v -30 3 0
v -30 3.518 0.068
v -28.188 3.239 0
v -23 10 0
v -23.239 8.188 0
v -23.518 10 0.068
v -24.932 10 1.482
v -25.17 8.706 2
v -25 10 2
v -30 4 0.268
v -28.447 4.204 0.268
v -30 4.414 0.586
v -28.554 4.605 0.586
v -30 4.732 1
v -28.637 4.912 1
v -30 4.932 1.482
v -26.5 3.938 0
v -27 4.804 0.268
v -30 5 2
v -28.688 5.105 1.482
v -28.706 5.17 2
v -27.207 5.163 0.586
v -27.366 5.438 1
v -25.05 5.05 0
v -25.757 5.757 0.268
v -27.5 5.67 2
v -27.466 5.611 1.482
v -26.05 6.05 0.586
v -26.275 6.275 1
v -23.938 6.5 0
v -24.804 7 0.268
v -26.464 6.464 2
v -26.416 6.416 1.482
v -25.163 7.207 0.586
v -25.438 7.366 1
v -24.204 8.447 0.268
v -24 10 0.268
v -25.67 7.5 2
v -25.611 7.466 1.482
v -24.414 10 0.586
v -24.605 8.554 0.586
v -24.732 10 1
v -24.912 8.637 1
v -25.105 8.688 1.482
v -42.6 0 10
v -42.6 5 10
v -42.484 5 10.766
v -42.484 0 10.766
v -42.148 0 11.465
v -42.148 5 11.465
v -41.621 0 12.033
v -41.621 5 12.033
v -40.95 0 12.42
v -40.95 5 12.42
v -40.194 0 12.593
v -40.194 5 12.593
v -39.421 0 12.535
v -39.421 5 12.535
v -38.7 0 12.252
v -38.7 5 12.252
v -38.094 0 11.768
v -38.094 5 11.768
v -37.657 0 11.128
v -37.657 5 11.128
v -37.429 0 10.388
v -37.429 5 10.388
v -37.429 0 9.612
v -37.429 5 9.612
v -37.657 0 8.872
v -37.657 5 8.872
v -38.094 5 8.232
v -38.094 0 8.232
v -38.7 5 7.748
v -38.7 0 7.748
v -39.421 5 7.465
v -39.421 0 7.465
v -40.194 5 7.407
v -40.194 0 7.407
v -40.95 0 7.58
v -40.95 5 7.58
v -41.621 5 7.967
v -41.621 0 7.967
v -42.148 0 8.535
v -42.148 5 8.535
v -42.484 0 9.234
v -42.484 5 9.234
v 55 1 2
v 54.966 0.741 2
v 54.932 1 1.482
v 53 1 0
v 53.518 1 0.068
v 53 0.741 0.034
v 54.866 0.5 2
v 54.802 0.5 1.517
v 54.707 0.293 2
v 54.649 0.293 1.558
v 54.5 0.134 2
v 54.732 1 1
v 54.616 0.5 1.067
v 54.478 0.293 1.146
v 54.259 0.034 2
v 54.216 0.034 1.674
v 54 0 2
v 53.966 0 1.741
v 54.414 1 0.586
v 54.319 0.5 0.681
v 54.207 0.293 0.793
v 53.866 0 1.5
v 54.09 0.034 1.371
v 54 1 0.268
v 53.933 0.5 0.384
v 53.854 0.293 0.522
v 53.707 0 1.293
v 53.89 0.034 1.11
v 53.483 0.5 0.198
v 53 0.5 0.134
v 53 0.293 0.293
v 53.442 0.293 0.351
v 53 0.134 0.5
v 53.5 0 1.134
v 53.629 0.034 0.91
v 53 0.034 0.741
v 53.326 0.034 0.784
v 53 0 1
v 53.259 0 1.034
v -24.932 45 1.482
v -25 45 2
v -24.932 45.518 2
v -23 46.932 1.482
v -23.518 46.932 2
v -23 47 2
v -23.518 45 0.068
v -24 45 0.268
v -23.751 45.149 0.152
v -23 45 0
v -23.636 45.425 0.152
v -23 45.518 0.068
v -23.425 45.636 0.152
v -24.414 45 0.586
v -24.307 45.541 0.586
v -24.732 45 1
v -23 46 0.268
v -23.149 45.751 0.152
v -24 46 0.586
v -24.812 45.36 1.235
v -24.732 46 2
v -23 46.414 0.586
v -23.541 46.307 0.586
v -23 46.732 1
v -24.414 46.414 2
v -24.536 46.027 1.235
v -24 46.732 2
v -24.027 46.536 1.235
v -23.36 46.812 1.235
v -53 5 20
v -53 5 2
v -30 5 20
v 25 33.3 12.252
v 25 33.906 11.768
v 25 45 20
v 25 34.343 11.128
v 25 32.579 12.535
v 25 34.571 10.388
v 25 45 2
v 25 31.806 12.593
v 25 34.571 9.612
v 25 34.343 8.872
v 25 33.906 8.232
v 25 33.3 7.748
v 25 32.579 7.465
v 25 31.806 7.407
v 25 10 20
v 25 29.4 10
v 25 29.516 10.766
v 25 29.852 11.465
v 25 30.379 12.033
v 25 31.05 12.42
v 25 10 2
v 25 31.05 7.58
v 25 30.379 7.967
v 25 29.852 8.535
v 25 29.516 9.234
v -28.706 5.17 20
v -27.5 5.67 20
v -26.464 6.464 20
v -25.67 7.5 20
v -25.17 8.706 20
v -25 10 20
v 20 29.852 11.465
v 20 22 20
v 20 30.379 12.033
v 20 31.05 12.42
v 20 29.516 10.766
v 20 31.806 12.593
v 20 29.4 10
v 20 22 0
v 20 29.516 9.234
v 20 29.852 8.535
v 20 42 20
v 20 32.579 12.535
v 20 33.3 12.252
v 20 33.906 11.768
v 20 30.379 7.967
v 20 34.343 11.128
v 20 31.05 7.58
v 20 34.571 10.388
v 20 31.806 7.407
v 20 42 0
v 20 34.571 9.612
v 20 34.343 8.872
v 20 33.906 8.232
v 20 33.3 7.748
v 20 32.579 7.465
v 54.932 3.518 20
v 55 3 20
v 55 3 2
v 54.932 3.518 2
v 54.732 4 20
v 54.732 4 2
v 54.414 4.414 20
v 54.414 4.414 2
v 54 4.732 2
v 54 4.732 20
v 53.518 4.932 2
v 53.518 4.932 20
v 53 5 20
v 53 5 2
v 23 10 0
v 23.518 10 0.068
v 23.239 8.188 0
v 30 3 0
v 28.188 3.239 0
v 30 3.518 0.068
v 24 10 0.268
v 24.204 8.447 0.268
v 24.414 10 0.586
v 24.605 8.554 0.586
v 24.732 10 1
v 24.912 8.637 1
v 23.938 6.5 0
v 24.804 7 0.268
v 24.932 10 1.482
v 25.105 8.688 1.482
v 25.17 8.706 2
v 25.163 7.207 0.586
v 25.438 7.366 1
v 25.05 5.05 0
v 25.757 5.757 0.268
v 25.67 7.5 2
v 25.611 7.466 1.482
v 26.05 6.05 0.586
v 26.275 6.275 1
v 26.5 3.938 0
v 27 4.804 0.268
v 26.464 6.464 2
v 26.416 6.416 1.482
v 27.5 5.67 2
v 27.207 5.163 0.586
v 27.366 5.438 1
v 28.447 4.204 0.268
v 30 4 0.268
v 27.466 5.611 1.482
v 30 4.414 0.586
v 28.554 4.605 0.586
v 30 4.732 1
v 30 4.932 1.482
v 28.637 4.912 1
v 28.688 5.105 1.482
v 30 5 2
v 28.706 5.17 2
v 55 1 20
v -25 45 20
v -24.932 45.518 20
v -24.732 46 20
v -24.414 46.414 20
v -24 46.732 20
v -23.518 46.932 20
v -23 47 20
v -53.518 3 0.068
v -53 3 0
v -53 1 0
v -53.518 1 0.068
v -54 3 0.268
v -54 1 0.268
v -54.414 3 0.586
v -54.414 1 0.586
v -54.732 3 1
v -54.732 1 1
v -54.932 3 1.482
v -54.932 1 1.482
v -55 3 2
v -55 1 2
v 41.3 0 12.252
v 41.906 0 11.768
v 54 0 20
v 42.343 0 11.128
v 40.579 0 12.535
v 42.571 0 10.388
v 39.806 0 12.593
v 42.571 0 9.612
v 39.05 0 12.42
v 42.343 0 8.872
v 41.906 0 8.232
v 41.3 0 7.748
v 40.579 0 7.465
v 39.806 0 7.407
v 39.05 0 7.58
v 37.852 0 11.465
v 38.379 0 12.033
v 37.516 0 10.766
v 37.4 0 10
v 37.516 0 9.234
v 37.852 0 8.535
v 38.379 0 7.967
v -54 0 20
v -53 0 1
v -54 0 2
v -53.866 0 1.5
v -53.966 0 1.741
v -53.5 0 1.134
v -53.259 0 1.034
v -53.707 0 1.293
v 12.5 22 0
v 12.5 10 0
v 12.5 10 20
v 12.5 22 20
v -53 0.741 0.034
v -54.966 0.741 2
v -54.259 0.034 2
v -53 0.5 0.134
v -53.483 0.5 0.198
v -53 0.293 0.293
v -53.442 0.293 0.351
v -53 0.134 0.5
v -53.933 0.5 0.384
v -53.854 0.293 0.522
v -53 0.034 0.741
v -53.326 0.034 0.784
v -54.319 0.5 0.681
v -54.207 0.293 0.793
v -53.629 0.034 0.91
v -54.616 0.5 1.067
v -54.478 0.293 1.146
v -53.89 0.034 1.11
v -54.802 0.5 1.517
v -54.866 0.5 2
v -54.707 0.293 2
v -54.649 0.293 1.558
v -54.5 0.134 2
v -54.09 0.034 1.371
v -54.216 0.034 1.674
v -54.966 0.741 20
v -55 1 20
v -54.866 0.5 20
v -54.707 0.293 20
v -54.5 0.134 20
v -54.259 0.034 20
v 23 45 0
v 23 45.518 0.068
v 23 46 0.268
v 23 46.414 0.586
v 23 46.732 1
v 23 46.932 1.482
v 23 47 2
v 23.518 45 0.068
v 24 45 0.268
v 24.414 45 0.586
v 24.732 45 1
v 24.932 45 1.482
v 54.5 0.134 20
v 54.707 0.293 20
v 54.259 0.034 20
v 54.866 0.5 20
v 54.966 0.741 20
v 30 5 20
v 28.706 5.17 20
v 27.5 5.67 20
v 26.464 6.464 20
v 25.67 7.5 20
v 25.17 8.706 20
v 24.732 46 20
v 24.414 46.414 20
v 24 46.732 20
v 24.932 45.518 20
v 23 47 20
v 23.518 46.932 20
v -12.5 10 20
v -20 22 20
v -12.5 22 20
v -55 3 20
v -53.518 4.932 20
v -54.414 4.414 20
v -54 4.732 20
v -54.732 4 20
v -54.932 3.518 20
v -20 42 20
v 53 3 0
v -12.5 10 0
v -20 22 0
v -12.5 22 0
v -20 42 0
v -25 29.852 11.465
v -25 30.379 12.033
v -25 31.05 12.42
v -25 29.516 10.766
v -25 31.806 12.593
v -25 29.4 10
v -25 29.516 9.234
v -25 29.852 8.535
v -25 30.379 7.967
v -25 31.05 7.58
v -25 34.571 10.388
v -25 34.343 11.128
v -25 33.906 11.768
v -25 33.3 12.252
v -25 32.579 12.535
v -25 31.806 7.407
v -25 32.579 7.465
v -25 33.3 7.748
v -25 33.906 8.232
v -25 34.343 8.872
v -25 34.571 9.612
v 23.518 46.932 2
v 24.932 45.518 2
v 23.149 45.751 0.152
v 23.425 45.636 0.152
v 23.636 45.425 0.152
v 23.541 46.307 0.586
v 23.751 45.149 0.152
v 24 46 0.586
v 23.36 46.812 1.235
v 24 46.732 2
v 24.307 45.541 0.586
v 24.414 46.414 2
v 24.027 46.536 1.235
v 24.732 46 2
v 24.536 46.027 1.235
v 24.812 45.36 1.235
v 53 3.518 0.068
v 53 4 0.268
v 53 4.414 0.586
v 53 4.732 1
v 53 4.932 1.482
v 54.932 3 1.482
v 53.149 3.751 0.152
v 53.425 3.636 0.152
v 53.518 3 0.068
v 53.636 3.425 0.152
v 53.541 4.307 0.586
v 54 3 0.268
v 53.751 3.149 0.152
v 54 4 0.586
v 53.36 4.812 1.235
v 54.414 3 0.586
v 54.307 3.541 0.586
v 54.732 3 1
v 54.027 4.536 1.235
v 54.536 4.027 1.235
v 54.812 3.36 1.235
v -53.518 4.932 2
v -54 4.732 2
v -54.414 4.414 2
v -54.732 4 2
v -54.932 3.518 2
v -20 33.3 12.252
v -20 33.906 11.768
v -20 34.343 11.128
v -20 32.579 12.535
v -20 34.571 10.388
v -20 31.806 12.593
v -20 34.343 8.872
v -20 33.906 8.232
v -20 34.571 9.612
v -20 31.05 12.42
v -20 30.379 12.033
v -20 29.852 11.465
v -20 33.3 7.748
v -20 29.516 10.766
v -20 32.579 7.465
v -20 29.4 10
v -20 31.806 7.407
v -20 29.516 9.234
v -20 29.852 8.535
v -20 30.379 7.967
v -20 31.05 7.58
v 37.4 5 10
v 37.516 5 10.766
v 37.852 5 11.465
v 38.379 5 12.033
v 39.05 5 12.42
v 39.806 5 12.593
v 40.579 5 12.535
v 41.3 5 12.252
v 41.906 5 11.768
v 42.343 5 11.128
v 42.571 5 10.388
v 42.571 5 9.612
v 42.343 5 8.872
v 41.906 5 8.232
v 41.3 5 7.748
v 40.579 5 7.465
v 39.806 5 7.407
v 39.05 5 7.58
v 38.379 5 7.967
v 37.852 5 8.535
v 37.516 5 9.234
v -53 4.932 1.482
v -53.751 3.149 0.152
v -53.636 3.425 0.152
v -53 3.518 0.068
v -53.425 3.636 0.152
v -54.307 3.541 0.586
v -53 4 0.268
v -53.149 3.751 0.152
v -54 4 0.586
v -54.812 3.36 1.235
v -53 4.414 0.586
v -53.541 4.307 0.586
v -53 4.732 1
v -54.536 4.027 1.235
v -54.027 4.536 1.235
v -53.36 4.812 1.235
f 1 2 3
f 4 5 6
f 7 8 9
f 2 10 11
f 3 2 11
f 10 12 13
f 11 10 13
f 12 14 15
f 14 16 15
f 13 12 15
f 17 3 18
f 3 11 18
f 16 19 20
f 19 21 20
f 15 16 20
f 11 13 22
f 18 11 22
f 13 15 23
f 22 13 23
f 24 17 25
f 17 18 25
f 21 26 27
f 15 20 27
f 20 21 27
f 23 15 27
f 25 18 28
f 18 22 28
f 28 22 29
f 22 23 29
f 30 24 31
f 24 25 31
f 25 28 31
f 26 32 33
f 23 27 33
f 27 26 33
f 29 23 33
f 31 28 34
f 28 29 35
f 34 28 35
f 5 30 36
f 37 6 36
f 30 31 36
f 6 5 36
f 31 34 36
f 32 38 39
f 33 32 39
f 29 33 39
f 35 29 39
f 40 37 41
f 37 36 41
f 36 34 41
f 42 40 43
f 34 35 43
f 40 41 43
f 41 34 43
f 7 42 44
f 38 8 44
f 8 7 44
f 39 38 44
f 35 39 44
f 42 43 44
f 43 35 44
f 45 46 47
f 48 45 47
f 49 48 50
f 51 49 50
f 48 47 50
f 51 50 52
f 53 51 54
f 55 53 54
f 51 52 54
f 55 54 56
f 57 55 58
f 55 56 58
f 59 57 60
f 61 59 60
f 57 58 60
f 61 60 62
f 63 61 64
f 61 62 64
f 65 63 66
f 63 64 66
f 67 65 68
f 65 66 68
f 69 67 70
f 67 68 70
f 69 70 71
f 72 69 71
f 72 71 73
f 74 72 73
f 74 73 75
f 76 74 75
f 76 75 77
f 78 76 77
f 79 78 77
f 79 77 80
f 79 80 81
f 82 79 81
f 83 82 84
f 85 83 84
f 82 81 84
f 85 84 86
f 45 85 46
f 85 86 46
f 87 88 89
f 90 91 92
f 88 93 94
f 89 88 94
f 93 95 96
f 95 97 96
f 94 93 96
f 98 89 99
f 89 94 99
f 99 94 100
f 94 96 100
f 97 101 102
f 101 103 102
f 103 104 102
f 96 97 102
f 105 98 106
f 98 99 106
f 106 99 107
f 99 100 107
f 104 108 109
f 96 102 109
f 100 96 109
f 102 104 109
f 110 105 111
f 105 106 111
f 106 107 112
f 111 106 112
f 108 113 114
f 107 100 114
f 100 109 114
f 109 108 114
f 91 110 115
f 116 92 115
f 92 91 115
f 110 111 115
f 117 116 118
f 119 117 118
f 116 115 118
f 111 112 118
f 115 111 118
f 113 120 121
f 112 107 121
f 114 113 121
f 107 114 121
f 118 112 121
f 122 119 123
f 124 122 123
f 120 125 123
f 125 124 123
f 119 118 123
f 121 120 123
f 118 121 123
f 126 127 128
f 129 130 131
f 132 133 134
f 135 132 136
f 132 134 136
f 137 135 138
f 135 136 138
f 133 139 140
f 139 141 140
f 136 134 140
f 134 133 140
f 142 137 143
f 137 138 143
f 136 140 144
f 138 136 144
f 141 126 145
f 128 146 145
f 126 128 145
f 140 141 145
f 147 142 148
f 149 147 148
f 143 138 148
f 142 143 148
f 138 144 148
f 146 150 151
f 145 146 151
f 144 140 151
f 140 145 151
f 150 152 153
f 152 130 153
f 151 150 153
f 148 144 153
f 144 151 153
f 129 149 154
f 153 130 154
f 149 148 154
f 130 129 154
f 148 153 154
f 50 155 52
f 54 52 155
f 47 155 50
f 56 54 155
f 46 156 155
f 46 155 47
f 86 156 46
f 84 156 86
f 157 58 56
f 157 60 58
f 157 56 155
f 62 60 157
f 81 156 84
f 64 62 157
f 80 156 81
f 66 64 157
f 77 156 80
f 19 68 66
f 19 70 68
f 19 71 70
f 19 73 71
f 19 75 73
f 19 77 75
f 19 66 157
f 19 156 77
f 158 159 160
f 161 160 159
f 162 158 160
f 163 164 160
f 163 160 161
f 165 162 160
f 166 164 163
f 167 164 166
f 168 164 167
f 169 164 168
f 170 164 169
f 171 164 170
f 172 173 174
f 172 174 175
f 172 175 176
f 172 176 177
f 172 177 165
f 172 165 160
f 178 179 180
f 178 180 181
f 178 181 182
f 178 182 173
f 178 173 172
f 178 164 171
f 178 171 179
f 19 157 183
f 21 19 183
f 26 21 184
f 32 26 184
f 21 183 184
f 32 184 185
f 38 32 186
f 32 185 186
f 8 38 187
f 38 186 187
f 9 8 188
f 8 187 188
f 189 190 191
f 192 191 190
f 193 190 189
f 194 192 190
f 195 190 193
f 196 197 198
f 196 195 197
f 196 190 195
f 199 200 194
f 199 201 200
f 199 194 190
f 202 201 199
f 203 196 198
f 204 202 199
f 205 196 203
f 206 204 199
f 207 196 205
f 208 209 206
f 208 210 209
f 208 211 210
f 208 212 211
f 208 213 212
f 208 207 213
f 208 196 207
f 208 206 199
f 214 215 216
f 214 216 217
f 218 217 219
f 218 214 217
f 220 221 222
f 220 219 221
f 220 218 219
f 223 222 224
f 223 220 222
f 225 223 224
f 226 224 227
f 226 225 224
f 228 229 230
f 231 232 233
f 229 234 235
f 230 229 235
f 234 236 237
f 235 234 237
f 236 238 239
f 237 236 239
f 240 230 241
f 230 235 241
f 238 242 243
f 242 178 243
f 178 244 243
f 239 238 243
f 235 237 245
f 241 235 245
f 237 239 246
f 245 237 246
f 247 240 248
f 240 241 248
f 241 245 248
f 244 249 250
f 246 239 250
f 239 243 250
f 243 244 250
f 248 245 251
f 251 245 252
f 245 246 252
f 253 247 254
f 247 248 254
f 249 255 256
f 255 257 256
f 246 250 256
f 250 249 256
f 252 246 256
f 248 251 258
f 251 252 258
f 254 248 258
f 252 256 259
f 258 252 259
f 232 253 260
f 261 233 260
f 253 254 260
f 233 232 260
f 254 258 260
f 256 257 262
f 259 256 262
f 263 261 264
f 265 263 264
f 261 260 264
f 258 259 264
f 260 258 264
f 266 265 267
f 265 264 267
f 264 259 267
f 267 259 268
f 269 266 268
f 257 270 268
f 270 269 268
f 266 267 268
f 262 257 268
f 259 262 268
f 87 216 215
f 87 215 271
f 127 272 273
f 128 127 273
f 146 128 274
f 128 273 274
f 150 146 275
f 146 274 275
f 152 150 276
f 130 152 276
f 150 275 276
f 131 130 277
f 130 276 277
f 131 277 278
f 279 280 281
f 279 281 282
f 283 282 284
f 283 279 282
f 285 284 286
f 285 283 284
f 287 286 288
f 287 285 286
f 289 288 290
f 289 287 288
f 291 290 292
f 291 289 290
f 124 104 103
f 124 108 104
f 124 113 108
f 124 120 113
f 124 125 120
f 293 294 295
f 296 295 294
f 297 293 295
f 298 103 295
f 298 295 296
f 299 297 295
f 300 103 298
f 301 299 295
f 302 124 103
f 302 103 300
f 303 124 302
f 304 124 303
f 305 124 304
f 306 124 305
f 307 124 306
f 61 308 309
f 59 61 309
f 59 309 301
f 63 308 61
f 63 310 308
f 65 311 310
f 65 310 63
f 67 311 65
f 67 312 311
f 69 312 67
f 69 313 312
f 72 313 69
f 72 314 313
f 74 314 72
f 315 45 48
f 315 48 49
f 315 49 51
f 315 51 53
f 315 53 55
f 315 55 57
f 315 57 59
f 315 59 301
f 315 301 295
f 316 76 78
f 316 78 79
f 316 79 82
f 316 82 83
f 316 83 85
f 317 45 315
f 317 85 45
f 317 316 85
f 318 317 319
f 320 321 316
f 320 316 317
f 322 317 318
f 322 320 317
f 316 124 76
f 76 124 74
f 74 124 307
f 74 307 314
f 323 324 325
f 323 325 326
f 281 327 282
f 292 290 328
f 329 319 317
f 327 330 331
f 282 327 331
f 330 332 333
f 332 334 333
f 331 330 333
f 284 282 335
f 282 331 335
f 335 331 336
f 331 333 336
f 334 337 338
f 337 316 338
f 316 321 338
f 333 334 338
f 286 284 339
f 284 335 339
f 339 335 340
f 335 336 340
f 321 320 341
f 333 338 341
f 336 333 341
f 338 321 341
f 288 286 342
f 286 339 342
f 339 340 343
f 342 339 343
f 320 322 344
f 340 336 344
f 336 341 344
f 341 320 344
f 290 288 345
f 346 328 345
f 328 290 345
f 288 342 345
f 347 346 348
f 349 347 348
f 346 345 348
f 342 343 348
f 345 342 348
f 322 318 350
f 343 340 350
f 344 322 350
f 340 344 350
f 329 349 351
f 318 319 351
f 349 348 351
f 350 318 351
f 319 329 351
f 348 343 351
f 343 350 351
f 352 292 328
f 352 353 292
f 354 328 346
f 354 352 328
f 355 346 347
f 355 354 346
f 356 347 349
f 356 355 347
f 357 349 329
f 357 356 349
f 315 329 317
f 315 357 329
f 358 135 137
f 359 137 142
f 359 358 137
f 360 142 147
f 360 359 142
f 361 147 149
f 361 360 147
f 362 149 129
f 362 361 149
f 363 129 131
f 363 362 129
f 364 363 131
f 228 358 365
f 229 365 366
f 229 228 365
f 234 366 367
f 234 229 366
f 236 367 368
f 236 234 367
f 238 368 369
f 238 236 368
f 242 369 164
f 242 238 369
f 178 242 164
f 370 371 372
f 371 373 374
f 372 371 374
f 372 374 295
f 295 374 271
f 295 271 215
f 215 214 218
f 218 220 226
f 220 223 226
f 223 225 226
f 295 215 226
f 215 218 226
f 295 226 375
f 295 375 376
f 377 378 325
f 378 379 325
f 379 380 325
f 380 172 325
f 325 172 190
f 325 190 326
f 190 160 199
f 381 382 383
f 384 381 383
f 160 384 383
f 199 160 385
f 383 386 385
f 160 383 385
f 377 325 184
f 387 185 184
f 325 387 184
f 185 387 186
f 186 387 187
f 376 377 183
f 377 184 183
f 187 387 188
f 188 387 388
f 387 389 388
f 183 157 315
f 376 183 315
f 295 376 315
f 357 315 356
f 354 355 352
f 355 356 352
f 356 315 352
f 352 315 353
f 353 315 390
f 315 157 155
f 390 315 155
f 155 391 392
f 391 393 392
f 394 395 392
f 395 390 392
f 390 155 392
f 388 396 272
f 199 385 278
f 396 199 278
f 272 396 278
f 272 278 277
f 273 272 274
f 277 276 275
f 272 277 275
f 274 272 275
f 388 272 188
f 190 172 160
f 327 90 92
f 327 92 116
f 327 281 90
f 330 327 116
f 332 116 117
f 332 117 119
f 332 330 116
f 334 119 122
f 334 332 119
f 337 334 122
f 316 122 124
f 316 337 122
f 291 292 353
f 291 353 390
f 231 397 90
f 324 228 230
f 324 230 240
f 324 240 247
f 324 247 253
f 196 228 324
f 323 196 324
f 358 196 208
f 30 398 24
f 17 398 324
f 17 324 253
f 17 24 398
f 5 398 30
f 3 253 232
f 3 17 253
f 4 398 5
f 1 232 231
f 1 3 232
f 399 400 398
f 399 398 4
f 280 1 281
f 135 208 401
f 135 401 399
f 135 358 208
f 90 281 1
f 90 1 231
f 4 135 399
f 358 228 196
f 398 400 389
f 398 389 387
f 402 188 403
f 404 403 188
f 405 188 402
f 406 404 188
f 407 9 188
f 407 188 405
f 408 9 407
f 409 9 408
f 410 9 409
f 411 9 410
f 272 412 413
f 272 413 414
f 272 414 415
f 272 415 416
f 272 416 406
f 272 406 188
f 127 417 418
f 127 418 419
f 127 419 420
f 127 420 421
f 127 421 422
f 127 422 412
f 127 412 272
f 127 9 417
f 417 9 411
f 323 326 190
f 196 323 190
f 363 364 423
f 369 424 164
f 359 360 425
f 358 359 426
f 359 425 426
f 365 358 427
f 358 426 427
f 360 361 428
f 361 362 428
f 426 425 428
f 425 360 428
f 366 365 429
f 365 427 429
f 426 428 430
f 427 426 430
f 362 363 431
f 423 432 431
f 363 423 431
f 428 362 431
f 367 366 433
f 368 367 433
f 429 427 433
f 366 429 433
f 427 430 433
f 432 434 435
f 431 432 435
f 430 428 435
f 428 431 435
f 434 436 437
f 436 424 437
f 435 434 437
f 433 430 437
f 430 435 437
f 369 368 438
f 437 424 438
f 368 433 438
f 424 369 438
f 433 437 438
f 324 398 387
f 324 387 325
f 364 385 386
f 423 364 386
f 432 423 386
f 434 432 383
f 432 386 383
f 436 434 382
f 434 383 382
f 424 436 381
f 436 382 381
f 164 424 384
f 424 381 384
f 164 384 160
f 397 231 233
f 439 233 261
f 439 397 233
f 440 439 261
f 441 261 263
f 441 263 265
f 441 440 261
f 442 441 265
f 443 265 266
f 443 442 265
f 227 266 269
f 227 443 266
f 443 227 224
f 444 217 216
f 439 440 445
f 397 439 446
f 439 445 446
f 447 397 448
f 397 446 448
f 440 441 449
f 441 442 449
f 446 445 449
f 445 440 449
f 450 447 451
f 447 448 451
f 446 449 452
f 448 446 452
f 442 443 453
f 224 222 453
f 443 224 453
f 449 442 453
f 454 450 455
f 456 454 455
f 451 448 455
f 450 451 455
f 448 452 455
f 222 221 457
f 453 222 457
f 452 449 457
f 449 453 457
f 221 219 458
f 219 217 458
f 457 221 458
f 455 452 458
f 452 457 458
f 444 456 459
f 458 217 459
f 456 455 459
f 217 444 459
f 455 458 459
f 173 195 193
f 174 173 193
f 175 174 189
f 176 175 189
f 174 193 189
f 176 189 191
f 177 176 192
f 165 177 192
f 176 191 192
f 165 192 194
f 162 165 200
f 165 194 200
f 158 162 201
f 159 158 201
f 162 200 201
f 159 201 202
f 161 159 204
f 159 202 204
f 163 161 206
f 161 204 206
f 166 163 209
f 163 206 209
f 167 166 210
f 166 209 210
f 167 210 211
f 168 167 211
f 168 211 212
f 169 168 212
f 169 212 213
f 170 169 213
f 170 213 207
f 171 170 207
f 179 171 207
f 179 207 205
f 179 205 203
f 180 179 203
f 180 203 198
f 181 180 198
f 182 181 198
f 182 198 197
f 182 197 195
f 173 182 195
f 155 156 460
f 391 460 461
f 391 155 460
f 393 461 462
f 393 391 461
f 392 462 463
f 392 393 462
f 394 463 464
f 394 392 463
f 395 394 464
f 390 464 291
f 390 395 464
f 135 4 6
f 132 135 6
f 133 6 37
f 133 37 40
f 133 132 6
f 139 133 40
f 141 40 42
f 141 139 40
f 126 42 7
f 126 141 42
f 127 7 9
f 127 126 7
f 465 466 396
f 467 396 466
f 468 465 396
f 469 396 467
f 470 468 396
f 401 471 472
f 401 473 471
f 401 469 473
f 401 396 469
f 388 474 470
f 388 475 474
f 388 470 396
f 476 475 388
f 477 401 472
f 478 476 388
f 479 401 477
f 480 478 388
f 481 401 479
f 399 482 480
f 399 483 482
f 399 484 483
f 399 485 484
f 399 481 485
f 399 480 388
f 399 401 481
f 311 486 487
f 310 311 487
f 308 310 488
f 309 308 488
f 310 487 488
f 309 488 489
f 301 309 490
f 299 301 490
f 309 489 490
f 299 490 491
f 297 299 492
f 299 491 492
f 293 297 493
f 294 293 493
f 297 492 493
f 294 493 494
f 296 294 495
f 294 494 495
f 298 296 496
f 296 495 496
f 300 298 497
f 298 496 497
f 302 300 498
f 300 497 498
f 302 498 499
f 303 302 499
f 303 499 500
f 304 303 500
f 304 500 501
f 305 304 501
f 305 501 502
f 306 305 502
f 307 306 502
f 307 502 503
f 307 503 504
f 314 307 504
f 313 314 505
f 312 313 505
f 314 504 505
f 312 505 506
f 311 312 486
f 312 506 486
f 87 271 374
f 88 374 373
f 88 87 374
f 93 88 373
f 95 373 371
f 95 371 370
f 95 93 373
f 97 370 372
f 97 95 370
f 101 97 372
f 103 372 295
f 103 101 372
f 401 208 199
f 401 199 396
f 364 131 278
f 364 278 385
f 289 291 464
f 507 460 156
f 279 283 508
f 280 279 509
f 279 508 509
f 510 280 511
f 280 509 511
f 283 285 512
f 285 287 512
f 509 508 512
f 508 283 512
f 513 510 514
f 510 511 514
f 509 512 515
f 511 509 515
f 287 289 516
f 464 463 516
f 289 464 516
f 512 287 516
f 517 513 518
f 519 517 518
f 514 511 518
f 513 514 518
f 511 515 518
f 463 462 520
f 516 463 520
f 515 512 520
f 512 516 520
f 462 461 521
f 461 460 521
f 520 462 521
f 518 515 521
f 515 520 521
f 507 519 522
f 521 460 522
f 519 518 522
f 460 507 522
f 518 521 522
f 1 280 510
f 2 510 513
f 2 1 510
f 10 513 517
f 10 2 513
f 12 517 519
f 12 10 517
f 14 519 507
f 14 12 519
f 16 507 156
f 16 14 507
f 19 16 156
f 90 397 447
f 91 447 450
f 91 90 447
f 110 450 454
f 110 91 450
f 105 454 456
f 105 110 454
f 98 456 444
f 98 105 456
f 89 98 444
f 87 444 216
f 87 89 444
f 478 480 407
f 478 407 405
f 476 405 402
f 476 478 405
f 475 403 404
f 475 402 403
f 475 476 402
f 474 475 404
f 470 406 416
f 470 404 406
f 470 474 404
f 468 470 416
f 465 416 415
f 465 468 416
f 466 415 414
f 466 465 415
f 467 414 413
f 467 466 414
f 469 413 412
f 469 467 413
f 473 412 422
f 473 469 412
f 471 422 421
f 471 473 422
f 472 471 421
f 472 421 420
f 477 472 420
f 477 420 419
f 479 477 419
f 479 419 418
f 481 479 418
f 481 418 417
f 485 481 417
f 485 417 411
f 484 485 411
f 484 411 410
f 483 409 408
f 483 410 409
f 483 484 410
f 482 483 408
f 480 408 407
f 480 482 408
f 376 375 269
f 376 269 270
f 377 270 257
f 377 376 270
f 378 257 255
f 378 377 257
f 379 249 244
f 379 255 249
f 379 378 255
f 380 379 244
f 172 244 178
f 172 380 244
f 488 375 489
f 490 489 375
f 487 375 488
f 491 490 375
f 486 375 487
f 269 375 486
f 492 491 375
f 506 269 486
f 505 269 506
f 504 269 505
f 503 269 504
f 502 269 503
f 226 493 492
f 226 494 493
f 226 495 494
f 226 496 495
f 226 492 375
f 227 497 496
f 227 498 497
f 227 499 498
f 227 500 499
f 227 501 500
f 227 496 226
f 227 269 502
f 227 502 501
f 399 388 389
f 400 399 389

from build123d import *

# Parameters (mm, degrees)
PAD_DEPTH            = 20
SKETCH001_R          = 2.6
POCKET_DEPTH         = 5
SKETCH002_R          = 2.6
POCKET001_DEPTH      = 35.001
POCKET001_DEPTH_BACK = -75.001
FILLET_R             = 5
FILLET001_R          = 2
FILLET002_R          = 2
FILLET003_R          = 1


with BuildPart() as part:
    # Sketch → Pad (new body)
    with BuildSketch(Plane.XY):
        Polygon((-55, 0), (-55, 5), (-25, 5), (-25, 47), (25, 47), (25, 5), (55, 5), (55, 0), align=None)
        Polygon((-20, 42), (-20, 22), (-12.5, 22), (-12.5, 10), (12.5, 10), (12.5, 22), (20, 22), (20, 42), align=None, mode=Mode.SUBTRACT)
    extrude(amount=PAD_DEPTH)

    # Sketch001 (on Face6 of Pad) → Pocket (cut)
    with BuildSketch(Plane(origin=(0, 5, 0), x_dir=(-1, 0, 0), z_dir=(0, 1, 0))):
        with Locations((-40, 10)):
            Circle(SKETCH001_R)
        with Locations((40, 10)):
            Circle(SKETCH001_R)
    extrude(amount=-POCKET_DEPTH, mode=Mode.SUBTRACT)

    # Sketch002 (on Face19 of Pocket) → Pocket001 (cut, two sides)
    with BuildSketch(Plane(origin=(20, 0, 0), x_dir=(0, -1, 0), z_dir=(-1, 0, 0))) as pocket001_sk:
        with Locations((-32, 10)):
            Circle(SKETCH002_R)
    extrude(amount=-POCKET001_DEPTH, mode=Mode.SUBTRACT)
    extrude(pocket001_sk.sketch, amount=-POCKET001_DEPTH_BACK, mode=Mode.SUBTRACT)

    # Fillet
    fillet_edges = [part.edges().sort_by_distance(p)[0] for p in [
        (25, 5, 10),
        (-25, 5, 10),
    ]]
    fillet(fillet_edges, radius=FILLET_R)

    # Fillet001
    fillet001_edges = [part.edges().sort_by_distance(p)[0] for p in [
        (-55, 5, 10),
        (-25, 47, 10),
        (25, 47, 10),
        (55, 5, 10),
    ]]
    fillet(fillet001_edges, radius=FILLET001_R)

    # Fillet002
    fillet002_edges = [part.edges().sort_by_distance(p)[0] for p in [
        (25, 27.5, 0),
    ]]
    fillet(fillet002_edges, radius=FILLET002_R)

    # Fillet003
    fillet003_edges = [part.edges().sort_by_distance(p)[0] for p in [
        (0, 0, 0),
    ]]
    fillet(fillet003_edges, radius=FILLET003_R)


solid = part.part
